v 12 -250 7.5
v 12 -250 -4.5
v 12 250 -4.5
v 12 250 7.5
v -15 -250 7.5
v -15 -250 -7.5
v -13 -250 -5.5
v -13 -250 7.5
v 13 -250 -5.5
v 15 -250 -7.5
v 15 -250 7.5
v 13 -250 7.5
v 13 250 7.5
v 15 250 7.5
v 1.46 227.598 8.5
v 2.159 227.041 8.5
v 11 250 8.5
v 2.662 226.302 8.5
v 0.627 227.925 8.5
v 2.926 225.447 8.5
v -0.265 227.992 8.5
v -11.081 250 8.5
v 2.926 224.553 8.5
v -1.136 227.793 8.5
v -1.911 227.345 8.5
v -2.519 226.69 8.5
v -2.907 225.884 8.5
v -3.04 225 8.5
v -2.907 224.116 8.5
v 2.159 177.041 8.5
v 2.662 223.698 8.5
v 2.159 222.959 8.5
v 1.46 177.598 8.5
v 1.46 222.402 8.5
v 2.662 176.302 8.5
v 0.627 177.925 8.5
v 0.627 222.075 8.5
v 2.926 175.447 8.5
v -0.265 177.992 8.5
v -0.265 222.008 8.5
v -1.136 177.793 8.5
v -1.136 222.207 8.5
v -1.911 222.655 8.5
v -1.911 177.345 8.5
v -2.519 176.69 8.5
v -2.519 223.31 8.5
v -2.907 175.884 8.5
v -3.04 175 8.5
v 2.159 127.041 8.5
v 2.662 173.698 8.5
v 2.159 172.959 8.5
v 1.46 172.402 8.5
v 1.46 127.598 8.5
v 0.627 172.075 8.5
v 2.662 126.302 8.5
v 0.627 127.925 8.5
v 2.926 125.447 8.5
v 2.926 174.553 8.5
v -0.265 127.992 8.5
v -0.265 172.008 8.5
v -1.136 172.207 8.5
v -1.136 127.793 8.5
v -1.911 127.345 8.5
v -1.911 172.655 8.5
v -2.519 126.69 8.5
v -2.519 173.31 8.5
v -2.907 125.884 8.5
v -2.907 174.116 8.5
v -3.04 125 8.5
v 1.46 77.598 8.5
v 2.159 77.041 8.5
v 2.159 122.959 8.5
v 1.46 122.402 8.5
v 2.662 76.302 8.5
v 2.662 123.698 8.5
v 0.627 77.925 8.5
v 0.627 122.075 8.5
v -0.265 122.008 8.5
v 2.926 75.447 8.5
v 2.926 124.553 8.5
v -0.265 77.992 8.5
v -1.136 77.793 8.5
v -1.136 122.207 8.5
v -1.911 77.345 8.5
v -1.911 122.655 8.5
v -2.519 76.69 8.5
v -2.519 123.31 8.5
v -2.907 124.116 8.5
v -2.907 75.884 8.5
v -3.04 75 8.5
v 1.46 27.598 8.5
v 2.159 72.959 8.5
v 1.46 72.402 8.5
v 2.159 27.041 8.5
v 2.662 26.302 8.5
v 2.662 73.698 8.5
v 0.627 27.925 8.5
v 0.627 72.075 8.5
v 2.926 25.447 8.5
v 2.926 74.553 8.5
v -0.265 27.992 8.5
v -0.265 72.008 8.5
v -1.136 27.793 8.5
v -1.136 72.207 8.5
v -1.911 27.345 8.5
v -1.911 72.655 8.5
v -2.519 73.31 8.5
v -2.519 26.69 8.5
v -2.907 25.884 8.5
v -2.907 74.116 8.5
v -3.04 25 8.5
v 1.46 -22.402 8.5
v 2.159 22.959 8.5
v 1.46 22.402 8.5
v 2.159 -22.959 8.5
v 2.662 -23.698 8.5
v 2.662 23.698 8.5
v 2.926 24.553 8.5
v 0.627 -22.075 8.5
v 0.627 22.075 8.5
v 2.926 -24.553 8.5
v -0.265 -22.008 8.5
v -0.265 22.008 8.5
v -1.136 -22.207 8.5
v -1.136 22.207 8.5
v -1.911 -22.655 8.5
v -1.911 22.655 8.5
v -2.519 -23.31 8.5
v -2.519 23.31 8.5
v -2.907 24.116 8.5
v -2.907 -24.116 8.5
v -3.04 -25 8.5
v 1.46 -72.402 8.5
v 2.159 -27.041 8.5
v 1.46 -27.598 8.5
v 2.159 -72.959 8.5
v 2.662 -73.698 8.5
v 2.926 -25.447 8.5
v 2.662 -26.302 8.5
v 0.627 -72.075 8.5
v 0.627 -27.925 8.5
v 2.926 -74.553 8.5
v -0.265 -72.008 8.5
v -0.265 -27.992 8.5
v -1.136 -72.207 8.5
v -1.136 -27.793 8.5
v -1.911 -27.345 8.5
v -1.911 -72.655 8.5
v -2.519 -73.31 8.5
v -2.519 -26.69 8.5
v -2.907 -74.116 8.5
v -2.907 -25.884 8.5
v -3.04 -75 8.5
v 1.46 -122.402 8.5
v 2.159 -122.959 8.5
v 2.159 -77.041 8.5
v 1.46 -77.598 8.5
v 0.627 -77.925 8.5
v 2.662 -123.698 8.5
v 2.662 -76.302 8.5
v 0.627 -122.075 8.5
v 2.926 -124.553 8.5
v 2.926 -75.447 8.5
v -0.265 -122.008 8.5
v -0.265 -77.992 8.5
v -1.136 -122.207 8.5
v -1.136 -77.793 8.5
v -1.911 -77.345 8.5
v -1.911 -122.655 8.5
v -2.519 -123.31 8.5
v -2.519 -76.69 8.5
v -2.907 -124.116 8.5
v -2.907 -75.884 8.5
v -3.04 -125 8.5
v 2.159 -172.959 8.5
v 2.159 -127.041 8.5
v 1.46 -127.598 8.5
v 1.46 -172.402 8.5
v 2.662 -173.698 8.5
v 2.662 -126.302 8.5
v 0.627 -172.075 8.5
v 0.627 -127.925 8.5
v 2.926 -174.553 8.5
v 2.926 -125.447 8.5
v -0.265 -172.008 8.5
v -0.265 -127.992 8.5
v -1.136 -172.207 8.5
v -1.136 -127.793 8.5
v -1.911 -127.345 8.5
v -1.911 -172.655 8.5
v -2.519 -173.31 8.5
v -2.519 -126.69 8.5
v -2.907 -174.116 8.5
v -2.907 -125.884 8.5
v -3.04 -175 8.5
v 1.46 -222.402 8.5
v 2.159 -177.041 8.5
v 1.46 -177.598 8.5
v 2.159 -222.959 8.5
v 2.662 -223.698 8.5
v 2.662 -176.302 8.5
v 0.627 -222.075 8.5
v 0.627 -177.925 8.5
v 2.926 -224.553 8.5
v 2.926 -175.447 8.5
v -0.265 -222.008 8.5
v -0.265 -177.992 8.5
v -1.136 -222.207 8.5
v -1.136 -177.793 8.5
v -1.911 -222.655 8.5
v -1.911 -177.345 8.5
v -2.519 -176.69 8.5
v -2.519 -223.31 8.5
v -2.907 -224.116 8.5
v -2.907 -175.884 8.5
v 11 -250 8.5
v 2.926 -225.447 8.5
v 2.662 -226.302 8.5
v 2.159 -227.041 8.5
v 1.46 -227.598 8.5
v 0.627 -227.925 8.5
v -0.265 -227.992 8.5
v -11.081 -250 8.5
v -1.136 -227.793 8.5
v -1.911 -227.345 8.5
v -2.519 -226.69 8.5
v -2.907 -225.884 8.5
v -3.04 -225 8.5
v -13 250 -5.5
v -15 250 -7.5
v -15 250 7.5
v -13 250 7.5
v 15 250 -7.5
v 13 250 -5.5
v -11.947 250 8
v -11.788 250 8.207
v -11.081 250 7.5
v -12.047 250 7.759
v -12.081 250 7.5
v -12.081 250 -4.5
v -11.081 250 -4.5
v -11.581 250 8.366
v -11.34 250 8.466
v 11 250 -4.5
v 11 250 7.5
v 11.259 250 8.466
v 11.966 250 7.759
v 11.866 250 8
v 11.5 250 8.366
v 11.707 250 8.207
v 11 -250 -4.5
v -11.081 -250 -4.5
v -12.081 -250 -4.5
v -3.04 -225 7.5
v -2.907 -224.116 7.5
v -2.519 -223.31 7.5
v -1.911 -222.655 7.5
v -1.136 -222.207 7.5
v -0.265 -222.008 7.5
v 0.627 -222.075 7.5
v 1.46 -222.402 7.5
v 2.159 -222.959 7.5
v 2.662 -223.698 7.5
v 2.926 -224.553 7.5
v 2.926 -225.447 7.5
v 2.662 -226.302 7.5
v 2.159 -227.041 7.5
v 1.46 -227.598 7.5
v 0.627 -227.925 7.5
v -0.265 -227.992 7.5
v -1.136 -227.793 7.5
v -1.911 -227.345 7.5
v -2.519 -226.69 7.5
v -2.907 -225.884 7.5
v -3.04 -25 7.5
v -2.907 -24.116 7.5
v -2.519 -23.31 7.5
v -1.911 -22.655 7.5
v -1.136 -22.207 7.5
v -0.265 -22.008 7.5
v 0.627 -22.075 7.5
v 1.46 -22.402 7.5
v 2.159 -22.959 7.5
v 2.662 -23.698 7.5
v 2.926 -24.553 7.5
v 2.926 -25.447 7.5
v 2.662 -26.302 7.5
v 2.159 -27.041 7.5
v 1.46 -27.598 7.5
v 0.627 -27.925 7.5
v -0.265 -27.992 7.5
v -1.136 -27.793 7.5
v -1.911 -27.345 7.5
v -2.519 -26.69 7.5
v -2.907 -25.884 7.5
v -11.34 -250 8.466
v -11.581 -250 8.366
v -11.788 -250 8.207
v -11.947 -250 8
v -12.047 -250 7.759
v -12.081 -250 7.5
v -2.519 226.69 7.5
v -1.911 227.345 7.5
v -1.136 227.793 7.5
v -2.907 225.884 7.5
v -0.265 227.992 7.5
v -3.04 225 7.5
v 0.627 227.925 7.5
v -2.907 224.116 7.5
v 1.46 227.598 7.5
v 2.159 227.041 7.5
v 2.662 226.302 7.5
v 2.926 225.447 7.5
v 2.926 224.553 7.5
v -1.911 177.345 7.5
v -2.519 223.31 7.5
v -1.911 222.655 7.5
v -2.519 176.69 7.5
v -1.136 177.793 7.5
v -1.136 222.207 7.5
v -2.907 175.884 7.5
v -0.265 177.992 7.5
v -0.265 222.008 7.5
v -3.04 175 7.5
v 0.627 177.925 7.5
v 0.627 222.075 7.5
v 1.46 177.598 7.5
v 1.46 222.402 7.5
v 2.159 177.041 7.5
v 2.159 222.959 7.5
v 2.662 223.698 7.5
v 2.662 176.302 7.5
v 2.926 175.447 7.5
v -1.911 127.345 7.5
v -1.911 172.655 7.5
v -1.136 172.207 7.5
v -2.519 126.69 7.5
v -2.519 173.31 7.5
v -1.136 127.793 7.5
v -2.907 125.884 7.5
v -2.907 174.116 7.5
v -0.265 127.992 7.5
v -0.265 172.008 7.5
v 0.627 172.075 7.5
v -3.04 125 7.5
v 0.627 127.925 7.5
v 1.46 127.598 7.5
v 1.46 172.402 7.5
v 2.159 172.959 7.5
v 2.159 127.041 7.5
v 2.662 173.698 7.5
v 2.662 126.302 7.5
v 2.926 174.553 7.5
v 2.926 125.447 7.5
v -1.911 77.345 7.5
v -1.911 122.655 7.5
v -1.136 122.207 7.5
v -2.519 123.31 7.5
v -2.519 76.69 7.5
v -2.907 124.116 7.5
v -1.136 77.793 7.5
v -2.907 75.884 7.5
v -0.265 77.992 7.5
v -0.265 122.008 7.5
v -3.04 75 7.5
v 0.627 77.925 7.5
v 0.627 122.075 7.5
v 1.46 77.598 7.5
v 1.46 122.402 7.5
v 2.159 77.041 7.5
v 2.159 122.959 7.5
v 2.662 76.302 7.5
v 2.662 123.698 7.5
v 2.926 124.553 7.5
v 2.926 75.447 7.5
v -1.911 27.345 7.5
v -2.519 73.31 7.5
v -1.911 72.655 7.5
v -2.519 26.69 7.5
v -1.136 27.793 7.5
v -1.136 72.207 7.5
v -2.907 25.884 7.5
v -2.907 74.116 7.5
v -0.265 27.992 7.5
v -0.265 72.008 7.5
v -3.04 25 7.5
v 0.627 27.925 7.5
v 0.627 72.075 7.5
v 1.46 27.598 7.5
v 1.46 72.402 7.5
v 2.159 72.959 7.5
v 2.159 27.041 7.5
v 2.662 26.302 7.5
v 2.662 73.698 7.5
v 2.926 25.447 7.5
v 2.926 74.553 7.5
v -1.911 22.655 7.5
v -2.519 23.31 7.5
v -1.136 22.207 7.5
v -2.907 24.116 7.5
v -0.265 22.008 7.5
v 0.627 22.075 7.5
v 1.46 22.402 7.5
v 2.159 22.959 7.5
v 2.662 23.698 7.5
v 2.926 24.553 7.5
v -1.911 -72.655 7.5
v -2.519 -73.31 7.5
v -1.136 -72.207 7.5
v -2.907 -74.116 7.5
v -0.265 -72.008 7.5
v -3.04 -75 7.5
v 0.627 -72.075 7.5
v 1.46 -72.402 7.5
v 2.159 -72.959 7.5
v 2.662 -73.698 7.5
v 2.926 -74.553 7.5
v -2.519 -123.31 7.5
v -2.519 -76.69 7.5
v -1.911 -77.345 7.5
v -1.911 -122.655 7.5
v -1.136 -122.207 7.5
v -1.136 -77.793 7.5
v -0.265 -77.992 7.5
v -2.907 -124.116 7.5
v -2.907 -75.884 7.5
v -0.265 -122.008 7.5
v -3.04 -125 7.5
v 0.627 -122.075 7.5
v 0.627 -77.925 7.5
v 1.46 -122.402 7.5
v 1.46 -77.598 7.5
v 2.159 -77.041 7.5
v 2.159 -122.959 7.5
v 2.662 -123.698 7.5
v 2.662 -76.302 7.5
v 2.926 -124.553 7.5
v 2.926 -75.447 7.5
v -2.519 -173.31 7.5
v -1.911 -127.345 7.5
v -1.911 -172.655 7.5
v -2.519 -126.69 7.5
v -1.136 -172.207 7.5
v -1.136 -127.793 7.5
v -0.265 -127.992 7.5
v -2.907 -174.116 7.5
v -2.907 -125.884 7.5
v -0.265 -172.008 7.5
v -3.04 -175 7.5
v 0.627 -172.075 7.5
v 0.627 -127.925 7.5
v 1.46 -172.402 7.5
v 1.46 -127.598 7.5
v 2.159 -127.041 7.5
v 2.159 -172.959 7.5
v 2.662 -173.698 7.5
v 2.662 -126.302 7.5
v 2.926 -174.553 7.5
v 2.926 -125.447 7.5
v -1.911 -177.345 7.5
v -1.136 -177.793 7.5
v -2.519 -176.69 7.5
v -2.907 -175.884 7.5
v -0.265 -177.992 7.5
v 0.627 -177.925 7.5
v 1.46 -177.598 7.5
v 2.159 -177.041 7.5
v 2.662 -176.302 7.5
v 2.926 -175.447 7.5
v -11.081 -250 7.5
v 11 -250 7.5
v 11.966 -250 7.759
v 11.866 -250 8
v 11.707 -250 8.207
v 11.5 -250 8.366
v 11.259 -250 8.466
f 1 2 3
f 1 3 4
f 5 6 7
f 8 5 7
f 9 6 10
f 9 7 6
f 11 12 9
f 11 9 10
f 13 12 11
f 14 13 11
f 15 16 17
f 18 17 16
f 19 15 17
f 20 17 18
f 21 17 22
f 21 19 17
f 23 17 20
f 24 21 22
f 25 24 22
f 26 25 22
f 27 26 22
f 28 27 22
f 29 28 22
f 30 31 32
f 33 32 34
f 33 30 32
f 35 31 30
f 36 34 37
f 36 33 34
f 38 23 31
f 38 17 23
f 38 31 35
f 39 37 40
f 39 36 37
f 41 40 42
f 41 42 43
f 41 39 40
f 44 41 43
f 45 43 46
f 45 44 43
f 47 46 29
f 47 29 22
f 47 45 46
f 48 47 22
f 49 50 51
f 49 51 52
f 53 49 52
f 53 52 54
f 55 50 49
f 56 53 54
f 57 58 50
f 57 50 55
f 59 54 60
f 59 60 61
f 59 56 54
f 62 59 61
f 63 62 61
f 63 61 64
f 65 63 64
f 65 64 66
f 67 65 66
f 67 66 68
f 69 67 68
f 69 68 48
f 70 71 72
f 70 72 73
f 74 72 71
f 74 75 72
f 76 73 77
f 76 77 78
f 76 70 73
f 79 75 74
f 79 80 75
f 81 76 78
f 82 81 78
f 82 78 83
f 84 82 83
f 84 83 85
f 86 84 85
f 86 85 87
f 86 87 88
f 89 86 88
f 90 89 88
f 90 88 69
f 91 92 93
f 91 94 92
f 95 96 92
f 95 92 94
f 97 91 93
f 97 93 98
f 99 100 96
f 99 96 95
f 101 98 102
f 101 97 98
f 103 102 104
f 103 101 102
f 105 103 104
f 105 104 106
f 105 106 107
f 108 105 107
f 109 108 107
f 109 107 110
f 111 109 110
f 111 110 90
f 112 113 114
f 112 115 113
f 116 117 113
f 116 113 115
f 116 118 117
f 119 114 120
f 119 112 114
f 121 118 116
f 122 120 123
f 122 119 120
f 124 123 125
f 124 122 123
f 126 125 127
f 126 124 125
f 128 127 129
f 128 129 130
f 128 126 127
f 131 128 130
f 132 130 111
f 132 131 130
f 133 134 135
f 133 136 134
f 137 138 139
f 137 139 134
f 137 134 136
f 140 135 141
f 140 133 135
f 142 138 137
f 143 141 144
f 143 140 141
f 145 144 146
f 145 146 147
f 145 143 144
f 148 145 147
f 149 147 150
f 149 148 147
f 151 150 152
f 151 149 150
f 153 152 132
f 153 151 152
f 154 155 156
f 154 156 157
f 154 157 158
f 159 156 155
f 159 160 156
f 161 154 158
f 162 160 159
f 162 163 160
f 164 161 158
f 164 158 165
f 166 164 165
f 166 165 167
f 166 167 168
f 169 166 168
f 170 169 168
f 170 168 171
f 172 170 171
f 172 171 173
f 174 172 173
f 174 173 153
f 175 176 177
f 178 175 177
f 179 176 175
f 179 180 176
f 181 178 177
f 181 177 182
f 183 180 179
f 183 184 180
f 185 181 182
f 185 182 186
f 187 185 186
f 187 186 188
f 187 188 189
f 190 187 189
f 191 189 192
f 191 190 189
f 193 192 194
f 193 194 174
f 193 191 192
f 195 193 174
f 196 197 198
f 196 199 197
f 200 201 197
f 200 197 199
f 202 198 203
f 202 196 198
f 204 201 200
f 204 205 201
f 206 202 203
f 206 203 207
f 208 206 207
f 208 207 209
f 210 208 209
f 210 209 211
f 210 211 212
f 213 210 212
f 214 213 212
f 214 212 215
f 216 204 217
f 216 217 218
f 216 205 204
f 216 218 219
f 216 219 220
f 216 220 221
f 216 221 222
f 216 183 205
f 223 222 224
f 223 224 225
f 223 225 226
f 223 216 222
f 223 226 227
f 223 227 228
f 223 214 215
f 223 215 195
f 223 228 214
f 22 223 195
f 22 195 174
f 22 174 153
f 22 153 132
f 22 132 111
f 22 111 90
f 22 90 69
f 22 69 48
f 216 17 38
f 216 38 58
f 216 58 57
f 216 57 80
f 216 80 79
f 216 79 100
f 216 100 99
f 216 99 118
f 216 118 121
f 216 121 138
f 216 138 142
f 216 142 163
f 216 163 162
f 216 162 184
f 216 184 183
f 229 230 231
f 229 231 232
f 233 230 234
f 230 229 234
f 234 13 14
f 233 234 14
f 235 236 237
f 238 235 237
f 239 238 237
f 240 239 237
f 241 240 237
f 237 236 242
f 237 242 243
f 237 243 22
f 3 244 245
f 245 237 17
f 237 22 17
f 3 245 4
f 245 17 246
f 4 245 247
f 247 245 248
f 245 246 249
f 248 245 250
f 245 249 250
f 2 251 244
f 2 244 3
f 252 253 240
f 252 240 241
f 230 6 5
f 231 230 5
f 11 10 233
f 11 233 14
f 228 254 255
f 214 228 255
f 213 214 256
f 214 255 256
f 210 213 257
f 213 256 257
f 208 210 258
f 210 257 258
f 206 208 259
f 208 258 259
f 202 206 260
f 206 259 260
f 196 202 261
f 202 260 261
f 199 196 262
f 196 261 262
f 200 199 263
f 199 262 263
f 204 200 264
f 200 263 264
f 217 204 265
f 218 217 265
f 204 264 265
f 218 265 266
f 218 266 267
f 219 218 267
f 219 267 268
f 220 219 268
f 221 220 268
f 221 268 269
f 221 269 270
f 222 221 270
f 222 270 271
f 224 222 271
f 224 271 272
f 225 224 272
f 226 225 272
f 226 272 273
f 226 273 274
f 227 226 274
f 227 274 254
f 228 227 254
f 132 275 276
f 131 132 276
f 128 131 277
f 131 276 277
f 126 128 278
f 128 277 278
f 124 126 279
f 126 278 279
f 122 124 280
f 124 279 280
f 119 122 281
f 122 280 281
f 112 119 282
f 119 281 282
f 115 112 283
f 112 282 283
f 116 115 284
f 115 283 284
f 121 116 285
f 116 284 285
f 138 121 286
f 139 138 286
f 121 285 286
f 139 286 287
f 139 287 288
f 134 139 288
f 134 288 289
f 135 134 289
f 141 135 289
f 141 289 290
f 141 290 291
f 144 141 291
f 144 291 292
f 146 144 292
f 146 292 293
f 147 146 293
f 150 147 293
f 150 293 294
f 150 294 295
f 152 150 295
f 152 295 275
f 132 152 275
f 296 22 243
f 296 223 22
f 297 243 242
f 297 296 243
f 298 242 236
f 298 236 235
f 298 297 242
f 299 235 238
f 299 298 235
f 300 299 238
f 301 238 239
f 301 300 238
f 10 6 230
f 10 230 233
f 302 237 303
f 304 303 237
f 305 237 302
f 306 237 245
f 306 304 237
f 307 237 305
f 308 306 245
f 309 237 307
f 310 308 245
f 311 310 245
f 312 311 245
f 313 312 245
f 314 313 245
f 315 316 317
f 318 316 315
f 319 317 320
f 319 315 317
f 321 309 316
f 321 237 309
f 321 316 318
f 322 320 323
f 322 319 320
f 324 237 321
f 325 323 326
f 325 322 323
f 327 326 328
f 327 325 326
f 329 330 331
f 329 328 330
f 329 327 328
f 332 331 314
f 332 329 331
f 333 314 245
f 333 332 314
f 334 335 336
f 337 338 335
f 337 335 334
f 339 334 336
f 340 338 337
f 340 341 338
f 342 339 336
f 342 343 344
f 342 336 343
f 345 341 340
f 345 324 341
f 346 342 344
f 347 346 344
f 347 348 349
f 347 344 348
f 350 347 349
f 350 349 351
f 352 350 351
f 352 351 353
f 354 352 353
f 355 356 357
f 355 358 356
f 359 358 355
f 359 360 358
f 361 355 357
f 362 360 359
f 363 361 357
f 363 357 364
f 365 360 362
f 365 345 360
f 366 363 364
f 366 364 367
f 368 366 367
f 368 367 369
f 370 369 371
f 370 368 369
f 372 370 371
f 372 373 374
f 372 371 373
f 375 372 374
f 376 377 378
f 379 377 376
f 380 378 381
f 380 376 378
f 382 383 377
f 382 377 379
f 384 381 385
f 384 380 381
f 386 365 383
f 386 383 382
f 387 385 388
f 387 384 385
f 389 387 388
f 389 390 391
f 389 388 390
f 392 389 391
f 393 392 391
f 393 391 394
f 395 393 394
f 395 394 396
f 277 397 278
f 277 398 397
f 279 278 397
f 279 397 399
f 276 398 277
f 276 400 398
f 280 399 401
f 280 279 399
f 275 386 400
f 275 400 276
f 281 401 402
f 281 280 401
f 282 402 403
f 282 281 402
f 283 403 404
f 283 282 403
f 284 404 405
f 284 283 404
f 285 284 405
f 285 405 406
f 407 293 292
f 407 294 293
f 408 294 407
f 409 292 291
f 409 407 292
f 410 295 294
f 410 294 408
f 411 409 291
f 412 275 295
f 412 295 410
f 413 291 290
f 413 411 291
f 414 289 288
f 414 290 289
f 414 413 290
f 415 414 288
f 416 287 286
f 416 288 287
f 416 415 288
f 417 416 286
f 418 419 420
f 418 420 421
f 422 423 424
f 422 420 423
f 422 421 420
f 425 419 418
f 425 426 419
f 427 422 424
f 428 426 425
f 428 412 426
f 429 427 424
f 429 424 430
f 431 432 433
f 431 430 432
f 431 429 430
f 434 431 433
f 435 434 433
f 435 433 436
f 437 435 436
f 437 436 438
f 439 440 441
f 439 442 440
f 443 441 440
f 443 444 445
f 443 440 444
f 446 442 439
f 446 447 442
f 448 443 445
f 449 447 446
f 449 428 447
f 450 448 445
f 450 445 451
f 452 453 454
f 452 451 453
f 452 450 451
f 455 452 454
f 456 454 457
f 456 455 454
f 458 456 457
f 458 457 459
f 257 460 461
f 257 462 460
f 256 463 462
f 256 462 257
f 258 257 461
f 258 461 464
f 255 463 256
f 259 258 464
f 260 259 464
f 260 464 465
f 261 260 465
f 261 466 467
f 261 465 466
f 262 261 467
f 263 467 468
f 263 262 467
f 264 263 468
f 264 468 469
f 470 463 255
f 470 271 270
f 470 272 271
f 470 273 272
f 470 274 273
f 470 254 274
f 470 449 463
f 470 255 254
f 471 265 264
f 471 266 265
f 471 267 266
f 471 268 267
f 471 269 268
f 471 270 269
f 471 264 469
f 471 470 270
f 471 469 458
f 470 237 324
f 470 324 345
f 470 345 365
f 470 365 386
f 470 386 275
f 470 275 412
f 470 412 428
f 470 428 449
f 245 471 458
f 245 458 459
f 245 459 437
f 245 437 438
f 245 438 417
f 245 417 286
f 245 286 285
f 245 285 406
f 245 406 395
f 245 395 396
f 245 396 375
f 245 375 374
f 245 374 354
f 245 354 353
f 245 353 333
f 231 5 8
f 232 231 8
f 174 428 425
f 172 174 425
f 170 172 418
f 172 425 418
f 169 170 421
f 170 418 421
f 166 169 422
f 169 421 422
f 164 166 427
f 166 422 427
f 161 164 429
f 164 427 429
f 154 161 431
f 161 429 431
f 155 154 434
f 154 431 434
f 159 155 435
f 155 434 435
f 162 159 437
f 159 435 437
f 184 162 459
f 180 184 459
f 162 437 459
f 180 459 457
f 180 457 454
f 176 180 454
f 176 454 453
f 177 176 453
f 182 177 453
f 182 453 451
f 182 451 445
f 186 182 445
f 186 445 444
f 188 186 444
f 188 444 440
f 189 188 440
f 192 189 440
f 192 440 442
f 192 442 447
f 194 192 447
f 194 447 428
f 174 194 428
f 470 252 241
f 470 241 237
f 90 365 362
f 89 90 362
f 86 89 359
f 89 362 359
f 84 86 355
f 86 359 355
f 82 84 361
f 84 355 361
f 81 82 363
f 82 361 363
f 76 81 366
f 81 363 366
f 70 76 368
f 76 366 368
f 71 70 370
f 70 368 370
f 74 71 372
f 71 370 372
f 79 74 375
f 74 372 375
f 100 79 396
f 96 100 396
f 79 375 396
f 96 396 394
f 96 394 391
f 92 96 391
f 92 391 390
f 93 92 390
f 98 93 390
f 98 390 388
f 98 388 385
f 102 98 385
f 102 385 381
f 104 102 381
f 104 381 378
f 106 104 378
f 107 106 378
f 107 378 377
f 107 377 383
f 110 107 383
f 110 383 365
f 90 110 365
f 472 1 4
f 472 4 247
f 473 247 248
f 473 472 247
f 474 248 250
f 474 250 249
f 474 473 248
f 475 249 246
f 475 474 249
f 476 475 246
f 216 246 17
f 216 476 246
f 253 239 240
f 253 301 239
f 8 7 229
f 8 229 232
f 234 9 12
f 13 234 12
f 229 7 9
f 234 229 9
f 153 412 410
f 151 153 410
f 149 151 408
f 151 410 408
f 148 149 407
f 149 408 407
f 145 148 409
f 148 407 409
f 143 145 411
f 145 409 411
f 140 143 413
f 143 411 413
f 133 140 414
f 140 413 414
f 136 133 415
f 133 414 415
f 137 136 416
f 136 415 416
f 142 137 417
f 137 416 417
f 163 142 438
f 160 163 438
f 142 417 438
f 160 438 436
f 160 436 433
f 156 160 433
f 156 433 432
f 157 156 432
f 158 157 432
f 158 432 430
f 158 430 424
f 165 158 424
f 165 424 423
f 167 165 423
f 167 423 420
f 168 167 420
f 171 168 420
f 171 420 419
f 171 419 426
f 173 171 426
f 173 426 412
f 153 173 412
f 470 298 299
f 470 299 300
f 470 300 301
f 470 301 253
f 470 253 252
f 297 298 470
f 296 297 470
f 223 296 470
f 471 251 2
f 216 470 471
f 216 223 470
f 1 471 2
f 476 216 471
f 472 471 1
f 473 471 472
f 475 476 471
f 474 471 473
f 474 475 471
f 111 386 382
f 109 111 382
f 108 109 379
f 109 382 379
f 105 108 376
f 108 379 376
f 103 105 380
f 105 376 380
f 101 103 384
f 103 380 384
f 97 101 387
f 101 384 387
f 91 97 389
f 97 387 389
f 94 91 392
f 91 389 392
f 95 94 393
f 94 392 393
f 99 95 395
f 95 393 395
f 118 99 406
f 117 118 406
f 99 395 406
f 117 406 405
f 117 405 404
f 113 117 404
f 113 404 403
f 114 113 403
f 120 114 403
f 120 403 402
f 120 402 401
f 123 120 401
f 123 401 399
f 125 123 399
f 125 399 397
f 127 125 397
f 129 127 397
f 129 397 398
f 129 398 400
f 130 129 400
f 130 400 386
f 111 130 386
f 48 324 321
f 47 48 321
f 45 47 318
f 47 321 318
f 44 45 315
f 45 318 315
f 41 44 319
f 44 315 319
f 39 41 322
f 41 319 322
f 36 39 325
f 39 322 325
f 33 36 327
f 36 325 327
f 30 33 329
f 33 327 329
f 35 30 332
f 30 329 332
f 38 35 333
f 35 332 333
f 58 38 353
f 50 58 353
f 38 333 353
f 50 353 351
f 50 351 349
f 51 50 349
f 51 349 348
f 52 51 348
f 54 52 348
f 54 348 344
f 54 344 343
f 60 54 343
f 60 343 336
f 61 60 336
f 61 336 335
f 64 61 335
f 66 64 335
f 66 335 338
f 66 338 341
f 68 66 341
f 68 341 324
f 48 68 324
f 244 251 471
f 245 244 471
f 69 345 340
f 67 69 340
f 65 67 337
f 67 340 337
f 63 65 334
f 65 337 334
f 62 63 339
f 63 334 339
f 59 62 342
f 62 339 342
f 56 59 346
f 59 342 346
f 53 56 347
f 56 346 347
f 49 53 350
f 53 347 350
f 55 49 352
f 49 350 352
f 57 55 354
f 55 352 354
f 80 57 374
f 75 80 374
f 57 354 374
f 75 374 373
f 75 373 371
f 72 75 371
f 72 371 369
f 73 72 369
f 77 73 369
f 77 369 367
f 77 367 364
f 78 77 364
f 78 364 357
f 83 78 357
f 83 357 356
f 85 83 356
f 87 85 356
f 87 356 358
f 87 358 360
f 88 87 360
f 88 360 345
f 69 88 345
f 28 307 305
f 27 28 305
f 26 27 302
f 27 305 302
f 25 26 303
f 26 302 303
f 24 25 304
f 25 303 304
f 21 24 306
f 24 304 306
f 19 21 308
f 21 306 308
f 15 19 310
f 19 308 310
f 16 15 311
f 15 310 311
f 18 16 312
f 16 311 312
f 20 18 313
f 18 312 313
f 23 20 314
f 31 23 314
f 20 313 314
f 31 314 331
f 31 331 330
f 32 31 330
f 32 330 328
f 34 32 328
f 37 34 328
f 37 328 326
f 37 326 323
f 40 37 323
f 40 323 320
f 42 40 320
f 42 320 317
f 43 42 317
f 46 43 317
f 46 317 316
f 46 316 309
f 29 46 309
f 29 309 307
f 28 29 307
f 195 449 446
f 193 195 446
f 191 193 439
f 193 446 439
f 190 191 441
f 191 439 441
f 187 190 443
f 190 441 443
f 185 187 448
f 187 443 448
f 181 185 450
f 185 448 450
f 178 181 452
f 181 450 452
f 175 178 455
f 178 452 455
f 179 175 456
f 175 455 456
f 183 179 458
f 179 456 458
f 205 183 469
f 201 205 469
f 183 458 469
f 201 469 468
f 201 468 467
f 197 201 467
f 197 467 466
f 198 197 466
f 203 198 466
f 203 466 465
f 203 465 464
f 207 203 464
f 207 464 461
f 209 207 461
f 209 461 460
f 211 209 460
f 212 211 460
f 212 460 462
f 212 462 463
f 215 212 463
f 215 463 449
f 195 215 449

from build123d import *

# Parameters (mm, degrees)
F0_W     = 30
F0_H     = 15
F2_DEPTH = 250
F1_W     = 26
F1_H     = 13
F3_DEPTH = 300
F6_DEPTH = 250
F5_W     = 22.0808668435
F5_H     = 12
F7_DEPTH = 300
F9_D     = 6


with BuildPart() as f2:
    # F0 (on Front) → F2 (new body, symmetric)
    with BuildSketch(Plane.XZ):
        Rectangle(F0_W, F0_H)
    extrude(amount=F2_DEPTH, both=True)

    # F1 (on face) → F3 (cut, symmetric)
    with BuildSketch(Plane.XZ):
        with Locations((0, 1)):
            Rectangle(F1_W, F1_H)
    extrude(amount=F3_DEPTH, both=True, mode=Mode.SUBTRACT)


with BuildPart() as f6:
    # F4 (on Front) → F6 (new body, symmetric)
    with BuildSketch(Plane.XZ):
        with BuildLine():
            Line((-12.0808668435, 7.5), (-12.0808668435, -4.5))
            Line((-12.0808668435, -4.5), (12, -4.5))
            Line((12, -4.5), (12, 7.5))
            ThreePointArc((12, 7.5), (11.7071067812, 8.2071067812), (11, 8.5))
            Line((11, 8.5), (-11.0808668435, 8.5))
            ThreePointArc((-11.0808668435, 8.5), (-11.7879736246, 8.2071067812), (-12.0808668435, 7.5))
        make_face()
    extrude(amount=F6_DEPTH, both=True)

    # F5 (on face) → F7 (cut, symmetric)
    with BuildSketch(Plane.XZ):
        with Locations((-0.0404334217, 1.5)):
            Rectangle(F5_W, F5_H)
    extrude(amount=F7_DEPTH, both=True, mode=Mode.SUBTRACT)

    # F9 (through all)
    with Locations(Plane.XY.offset(8.5)):
        with Locations((-0.0404334217, -225), (-0.0404334217, -175), (-0.0404334217, -125), (-0.0404334217, -75), (-0.0404334217, -25), (-0.0404334217, 25), (-0.0404334217, 75), (-0.0404334217, 125), (-0.0404334217, 175), (-0.0404334217, 225)):
            Hole(F9_D / 2)


solid = Compound([f2.part, f6.part])
